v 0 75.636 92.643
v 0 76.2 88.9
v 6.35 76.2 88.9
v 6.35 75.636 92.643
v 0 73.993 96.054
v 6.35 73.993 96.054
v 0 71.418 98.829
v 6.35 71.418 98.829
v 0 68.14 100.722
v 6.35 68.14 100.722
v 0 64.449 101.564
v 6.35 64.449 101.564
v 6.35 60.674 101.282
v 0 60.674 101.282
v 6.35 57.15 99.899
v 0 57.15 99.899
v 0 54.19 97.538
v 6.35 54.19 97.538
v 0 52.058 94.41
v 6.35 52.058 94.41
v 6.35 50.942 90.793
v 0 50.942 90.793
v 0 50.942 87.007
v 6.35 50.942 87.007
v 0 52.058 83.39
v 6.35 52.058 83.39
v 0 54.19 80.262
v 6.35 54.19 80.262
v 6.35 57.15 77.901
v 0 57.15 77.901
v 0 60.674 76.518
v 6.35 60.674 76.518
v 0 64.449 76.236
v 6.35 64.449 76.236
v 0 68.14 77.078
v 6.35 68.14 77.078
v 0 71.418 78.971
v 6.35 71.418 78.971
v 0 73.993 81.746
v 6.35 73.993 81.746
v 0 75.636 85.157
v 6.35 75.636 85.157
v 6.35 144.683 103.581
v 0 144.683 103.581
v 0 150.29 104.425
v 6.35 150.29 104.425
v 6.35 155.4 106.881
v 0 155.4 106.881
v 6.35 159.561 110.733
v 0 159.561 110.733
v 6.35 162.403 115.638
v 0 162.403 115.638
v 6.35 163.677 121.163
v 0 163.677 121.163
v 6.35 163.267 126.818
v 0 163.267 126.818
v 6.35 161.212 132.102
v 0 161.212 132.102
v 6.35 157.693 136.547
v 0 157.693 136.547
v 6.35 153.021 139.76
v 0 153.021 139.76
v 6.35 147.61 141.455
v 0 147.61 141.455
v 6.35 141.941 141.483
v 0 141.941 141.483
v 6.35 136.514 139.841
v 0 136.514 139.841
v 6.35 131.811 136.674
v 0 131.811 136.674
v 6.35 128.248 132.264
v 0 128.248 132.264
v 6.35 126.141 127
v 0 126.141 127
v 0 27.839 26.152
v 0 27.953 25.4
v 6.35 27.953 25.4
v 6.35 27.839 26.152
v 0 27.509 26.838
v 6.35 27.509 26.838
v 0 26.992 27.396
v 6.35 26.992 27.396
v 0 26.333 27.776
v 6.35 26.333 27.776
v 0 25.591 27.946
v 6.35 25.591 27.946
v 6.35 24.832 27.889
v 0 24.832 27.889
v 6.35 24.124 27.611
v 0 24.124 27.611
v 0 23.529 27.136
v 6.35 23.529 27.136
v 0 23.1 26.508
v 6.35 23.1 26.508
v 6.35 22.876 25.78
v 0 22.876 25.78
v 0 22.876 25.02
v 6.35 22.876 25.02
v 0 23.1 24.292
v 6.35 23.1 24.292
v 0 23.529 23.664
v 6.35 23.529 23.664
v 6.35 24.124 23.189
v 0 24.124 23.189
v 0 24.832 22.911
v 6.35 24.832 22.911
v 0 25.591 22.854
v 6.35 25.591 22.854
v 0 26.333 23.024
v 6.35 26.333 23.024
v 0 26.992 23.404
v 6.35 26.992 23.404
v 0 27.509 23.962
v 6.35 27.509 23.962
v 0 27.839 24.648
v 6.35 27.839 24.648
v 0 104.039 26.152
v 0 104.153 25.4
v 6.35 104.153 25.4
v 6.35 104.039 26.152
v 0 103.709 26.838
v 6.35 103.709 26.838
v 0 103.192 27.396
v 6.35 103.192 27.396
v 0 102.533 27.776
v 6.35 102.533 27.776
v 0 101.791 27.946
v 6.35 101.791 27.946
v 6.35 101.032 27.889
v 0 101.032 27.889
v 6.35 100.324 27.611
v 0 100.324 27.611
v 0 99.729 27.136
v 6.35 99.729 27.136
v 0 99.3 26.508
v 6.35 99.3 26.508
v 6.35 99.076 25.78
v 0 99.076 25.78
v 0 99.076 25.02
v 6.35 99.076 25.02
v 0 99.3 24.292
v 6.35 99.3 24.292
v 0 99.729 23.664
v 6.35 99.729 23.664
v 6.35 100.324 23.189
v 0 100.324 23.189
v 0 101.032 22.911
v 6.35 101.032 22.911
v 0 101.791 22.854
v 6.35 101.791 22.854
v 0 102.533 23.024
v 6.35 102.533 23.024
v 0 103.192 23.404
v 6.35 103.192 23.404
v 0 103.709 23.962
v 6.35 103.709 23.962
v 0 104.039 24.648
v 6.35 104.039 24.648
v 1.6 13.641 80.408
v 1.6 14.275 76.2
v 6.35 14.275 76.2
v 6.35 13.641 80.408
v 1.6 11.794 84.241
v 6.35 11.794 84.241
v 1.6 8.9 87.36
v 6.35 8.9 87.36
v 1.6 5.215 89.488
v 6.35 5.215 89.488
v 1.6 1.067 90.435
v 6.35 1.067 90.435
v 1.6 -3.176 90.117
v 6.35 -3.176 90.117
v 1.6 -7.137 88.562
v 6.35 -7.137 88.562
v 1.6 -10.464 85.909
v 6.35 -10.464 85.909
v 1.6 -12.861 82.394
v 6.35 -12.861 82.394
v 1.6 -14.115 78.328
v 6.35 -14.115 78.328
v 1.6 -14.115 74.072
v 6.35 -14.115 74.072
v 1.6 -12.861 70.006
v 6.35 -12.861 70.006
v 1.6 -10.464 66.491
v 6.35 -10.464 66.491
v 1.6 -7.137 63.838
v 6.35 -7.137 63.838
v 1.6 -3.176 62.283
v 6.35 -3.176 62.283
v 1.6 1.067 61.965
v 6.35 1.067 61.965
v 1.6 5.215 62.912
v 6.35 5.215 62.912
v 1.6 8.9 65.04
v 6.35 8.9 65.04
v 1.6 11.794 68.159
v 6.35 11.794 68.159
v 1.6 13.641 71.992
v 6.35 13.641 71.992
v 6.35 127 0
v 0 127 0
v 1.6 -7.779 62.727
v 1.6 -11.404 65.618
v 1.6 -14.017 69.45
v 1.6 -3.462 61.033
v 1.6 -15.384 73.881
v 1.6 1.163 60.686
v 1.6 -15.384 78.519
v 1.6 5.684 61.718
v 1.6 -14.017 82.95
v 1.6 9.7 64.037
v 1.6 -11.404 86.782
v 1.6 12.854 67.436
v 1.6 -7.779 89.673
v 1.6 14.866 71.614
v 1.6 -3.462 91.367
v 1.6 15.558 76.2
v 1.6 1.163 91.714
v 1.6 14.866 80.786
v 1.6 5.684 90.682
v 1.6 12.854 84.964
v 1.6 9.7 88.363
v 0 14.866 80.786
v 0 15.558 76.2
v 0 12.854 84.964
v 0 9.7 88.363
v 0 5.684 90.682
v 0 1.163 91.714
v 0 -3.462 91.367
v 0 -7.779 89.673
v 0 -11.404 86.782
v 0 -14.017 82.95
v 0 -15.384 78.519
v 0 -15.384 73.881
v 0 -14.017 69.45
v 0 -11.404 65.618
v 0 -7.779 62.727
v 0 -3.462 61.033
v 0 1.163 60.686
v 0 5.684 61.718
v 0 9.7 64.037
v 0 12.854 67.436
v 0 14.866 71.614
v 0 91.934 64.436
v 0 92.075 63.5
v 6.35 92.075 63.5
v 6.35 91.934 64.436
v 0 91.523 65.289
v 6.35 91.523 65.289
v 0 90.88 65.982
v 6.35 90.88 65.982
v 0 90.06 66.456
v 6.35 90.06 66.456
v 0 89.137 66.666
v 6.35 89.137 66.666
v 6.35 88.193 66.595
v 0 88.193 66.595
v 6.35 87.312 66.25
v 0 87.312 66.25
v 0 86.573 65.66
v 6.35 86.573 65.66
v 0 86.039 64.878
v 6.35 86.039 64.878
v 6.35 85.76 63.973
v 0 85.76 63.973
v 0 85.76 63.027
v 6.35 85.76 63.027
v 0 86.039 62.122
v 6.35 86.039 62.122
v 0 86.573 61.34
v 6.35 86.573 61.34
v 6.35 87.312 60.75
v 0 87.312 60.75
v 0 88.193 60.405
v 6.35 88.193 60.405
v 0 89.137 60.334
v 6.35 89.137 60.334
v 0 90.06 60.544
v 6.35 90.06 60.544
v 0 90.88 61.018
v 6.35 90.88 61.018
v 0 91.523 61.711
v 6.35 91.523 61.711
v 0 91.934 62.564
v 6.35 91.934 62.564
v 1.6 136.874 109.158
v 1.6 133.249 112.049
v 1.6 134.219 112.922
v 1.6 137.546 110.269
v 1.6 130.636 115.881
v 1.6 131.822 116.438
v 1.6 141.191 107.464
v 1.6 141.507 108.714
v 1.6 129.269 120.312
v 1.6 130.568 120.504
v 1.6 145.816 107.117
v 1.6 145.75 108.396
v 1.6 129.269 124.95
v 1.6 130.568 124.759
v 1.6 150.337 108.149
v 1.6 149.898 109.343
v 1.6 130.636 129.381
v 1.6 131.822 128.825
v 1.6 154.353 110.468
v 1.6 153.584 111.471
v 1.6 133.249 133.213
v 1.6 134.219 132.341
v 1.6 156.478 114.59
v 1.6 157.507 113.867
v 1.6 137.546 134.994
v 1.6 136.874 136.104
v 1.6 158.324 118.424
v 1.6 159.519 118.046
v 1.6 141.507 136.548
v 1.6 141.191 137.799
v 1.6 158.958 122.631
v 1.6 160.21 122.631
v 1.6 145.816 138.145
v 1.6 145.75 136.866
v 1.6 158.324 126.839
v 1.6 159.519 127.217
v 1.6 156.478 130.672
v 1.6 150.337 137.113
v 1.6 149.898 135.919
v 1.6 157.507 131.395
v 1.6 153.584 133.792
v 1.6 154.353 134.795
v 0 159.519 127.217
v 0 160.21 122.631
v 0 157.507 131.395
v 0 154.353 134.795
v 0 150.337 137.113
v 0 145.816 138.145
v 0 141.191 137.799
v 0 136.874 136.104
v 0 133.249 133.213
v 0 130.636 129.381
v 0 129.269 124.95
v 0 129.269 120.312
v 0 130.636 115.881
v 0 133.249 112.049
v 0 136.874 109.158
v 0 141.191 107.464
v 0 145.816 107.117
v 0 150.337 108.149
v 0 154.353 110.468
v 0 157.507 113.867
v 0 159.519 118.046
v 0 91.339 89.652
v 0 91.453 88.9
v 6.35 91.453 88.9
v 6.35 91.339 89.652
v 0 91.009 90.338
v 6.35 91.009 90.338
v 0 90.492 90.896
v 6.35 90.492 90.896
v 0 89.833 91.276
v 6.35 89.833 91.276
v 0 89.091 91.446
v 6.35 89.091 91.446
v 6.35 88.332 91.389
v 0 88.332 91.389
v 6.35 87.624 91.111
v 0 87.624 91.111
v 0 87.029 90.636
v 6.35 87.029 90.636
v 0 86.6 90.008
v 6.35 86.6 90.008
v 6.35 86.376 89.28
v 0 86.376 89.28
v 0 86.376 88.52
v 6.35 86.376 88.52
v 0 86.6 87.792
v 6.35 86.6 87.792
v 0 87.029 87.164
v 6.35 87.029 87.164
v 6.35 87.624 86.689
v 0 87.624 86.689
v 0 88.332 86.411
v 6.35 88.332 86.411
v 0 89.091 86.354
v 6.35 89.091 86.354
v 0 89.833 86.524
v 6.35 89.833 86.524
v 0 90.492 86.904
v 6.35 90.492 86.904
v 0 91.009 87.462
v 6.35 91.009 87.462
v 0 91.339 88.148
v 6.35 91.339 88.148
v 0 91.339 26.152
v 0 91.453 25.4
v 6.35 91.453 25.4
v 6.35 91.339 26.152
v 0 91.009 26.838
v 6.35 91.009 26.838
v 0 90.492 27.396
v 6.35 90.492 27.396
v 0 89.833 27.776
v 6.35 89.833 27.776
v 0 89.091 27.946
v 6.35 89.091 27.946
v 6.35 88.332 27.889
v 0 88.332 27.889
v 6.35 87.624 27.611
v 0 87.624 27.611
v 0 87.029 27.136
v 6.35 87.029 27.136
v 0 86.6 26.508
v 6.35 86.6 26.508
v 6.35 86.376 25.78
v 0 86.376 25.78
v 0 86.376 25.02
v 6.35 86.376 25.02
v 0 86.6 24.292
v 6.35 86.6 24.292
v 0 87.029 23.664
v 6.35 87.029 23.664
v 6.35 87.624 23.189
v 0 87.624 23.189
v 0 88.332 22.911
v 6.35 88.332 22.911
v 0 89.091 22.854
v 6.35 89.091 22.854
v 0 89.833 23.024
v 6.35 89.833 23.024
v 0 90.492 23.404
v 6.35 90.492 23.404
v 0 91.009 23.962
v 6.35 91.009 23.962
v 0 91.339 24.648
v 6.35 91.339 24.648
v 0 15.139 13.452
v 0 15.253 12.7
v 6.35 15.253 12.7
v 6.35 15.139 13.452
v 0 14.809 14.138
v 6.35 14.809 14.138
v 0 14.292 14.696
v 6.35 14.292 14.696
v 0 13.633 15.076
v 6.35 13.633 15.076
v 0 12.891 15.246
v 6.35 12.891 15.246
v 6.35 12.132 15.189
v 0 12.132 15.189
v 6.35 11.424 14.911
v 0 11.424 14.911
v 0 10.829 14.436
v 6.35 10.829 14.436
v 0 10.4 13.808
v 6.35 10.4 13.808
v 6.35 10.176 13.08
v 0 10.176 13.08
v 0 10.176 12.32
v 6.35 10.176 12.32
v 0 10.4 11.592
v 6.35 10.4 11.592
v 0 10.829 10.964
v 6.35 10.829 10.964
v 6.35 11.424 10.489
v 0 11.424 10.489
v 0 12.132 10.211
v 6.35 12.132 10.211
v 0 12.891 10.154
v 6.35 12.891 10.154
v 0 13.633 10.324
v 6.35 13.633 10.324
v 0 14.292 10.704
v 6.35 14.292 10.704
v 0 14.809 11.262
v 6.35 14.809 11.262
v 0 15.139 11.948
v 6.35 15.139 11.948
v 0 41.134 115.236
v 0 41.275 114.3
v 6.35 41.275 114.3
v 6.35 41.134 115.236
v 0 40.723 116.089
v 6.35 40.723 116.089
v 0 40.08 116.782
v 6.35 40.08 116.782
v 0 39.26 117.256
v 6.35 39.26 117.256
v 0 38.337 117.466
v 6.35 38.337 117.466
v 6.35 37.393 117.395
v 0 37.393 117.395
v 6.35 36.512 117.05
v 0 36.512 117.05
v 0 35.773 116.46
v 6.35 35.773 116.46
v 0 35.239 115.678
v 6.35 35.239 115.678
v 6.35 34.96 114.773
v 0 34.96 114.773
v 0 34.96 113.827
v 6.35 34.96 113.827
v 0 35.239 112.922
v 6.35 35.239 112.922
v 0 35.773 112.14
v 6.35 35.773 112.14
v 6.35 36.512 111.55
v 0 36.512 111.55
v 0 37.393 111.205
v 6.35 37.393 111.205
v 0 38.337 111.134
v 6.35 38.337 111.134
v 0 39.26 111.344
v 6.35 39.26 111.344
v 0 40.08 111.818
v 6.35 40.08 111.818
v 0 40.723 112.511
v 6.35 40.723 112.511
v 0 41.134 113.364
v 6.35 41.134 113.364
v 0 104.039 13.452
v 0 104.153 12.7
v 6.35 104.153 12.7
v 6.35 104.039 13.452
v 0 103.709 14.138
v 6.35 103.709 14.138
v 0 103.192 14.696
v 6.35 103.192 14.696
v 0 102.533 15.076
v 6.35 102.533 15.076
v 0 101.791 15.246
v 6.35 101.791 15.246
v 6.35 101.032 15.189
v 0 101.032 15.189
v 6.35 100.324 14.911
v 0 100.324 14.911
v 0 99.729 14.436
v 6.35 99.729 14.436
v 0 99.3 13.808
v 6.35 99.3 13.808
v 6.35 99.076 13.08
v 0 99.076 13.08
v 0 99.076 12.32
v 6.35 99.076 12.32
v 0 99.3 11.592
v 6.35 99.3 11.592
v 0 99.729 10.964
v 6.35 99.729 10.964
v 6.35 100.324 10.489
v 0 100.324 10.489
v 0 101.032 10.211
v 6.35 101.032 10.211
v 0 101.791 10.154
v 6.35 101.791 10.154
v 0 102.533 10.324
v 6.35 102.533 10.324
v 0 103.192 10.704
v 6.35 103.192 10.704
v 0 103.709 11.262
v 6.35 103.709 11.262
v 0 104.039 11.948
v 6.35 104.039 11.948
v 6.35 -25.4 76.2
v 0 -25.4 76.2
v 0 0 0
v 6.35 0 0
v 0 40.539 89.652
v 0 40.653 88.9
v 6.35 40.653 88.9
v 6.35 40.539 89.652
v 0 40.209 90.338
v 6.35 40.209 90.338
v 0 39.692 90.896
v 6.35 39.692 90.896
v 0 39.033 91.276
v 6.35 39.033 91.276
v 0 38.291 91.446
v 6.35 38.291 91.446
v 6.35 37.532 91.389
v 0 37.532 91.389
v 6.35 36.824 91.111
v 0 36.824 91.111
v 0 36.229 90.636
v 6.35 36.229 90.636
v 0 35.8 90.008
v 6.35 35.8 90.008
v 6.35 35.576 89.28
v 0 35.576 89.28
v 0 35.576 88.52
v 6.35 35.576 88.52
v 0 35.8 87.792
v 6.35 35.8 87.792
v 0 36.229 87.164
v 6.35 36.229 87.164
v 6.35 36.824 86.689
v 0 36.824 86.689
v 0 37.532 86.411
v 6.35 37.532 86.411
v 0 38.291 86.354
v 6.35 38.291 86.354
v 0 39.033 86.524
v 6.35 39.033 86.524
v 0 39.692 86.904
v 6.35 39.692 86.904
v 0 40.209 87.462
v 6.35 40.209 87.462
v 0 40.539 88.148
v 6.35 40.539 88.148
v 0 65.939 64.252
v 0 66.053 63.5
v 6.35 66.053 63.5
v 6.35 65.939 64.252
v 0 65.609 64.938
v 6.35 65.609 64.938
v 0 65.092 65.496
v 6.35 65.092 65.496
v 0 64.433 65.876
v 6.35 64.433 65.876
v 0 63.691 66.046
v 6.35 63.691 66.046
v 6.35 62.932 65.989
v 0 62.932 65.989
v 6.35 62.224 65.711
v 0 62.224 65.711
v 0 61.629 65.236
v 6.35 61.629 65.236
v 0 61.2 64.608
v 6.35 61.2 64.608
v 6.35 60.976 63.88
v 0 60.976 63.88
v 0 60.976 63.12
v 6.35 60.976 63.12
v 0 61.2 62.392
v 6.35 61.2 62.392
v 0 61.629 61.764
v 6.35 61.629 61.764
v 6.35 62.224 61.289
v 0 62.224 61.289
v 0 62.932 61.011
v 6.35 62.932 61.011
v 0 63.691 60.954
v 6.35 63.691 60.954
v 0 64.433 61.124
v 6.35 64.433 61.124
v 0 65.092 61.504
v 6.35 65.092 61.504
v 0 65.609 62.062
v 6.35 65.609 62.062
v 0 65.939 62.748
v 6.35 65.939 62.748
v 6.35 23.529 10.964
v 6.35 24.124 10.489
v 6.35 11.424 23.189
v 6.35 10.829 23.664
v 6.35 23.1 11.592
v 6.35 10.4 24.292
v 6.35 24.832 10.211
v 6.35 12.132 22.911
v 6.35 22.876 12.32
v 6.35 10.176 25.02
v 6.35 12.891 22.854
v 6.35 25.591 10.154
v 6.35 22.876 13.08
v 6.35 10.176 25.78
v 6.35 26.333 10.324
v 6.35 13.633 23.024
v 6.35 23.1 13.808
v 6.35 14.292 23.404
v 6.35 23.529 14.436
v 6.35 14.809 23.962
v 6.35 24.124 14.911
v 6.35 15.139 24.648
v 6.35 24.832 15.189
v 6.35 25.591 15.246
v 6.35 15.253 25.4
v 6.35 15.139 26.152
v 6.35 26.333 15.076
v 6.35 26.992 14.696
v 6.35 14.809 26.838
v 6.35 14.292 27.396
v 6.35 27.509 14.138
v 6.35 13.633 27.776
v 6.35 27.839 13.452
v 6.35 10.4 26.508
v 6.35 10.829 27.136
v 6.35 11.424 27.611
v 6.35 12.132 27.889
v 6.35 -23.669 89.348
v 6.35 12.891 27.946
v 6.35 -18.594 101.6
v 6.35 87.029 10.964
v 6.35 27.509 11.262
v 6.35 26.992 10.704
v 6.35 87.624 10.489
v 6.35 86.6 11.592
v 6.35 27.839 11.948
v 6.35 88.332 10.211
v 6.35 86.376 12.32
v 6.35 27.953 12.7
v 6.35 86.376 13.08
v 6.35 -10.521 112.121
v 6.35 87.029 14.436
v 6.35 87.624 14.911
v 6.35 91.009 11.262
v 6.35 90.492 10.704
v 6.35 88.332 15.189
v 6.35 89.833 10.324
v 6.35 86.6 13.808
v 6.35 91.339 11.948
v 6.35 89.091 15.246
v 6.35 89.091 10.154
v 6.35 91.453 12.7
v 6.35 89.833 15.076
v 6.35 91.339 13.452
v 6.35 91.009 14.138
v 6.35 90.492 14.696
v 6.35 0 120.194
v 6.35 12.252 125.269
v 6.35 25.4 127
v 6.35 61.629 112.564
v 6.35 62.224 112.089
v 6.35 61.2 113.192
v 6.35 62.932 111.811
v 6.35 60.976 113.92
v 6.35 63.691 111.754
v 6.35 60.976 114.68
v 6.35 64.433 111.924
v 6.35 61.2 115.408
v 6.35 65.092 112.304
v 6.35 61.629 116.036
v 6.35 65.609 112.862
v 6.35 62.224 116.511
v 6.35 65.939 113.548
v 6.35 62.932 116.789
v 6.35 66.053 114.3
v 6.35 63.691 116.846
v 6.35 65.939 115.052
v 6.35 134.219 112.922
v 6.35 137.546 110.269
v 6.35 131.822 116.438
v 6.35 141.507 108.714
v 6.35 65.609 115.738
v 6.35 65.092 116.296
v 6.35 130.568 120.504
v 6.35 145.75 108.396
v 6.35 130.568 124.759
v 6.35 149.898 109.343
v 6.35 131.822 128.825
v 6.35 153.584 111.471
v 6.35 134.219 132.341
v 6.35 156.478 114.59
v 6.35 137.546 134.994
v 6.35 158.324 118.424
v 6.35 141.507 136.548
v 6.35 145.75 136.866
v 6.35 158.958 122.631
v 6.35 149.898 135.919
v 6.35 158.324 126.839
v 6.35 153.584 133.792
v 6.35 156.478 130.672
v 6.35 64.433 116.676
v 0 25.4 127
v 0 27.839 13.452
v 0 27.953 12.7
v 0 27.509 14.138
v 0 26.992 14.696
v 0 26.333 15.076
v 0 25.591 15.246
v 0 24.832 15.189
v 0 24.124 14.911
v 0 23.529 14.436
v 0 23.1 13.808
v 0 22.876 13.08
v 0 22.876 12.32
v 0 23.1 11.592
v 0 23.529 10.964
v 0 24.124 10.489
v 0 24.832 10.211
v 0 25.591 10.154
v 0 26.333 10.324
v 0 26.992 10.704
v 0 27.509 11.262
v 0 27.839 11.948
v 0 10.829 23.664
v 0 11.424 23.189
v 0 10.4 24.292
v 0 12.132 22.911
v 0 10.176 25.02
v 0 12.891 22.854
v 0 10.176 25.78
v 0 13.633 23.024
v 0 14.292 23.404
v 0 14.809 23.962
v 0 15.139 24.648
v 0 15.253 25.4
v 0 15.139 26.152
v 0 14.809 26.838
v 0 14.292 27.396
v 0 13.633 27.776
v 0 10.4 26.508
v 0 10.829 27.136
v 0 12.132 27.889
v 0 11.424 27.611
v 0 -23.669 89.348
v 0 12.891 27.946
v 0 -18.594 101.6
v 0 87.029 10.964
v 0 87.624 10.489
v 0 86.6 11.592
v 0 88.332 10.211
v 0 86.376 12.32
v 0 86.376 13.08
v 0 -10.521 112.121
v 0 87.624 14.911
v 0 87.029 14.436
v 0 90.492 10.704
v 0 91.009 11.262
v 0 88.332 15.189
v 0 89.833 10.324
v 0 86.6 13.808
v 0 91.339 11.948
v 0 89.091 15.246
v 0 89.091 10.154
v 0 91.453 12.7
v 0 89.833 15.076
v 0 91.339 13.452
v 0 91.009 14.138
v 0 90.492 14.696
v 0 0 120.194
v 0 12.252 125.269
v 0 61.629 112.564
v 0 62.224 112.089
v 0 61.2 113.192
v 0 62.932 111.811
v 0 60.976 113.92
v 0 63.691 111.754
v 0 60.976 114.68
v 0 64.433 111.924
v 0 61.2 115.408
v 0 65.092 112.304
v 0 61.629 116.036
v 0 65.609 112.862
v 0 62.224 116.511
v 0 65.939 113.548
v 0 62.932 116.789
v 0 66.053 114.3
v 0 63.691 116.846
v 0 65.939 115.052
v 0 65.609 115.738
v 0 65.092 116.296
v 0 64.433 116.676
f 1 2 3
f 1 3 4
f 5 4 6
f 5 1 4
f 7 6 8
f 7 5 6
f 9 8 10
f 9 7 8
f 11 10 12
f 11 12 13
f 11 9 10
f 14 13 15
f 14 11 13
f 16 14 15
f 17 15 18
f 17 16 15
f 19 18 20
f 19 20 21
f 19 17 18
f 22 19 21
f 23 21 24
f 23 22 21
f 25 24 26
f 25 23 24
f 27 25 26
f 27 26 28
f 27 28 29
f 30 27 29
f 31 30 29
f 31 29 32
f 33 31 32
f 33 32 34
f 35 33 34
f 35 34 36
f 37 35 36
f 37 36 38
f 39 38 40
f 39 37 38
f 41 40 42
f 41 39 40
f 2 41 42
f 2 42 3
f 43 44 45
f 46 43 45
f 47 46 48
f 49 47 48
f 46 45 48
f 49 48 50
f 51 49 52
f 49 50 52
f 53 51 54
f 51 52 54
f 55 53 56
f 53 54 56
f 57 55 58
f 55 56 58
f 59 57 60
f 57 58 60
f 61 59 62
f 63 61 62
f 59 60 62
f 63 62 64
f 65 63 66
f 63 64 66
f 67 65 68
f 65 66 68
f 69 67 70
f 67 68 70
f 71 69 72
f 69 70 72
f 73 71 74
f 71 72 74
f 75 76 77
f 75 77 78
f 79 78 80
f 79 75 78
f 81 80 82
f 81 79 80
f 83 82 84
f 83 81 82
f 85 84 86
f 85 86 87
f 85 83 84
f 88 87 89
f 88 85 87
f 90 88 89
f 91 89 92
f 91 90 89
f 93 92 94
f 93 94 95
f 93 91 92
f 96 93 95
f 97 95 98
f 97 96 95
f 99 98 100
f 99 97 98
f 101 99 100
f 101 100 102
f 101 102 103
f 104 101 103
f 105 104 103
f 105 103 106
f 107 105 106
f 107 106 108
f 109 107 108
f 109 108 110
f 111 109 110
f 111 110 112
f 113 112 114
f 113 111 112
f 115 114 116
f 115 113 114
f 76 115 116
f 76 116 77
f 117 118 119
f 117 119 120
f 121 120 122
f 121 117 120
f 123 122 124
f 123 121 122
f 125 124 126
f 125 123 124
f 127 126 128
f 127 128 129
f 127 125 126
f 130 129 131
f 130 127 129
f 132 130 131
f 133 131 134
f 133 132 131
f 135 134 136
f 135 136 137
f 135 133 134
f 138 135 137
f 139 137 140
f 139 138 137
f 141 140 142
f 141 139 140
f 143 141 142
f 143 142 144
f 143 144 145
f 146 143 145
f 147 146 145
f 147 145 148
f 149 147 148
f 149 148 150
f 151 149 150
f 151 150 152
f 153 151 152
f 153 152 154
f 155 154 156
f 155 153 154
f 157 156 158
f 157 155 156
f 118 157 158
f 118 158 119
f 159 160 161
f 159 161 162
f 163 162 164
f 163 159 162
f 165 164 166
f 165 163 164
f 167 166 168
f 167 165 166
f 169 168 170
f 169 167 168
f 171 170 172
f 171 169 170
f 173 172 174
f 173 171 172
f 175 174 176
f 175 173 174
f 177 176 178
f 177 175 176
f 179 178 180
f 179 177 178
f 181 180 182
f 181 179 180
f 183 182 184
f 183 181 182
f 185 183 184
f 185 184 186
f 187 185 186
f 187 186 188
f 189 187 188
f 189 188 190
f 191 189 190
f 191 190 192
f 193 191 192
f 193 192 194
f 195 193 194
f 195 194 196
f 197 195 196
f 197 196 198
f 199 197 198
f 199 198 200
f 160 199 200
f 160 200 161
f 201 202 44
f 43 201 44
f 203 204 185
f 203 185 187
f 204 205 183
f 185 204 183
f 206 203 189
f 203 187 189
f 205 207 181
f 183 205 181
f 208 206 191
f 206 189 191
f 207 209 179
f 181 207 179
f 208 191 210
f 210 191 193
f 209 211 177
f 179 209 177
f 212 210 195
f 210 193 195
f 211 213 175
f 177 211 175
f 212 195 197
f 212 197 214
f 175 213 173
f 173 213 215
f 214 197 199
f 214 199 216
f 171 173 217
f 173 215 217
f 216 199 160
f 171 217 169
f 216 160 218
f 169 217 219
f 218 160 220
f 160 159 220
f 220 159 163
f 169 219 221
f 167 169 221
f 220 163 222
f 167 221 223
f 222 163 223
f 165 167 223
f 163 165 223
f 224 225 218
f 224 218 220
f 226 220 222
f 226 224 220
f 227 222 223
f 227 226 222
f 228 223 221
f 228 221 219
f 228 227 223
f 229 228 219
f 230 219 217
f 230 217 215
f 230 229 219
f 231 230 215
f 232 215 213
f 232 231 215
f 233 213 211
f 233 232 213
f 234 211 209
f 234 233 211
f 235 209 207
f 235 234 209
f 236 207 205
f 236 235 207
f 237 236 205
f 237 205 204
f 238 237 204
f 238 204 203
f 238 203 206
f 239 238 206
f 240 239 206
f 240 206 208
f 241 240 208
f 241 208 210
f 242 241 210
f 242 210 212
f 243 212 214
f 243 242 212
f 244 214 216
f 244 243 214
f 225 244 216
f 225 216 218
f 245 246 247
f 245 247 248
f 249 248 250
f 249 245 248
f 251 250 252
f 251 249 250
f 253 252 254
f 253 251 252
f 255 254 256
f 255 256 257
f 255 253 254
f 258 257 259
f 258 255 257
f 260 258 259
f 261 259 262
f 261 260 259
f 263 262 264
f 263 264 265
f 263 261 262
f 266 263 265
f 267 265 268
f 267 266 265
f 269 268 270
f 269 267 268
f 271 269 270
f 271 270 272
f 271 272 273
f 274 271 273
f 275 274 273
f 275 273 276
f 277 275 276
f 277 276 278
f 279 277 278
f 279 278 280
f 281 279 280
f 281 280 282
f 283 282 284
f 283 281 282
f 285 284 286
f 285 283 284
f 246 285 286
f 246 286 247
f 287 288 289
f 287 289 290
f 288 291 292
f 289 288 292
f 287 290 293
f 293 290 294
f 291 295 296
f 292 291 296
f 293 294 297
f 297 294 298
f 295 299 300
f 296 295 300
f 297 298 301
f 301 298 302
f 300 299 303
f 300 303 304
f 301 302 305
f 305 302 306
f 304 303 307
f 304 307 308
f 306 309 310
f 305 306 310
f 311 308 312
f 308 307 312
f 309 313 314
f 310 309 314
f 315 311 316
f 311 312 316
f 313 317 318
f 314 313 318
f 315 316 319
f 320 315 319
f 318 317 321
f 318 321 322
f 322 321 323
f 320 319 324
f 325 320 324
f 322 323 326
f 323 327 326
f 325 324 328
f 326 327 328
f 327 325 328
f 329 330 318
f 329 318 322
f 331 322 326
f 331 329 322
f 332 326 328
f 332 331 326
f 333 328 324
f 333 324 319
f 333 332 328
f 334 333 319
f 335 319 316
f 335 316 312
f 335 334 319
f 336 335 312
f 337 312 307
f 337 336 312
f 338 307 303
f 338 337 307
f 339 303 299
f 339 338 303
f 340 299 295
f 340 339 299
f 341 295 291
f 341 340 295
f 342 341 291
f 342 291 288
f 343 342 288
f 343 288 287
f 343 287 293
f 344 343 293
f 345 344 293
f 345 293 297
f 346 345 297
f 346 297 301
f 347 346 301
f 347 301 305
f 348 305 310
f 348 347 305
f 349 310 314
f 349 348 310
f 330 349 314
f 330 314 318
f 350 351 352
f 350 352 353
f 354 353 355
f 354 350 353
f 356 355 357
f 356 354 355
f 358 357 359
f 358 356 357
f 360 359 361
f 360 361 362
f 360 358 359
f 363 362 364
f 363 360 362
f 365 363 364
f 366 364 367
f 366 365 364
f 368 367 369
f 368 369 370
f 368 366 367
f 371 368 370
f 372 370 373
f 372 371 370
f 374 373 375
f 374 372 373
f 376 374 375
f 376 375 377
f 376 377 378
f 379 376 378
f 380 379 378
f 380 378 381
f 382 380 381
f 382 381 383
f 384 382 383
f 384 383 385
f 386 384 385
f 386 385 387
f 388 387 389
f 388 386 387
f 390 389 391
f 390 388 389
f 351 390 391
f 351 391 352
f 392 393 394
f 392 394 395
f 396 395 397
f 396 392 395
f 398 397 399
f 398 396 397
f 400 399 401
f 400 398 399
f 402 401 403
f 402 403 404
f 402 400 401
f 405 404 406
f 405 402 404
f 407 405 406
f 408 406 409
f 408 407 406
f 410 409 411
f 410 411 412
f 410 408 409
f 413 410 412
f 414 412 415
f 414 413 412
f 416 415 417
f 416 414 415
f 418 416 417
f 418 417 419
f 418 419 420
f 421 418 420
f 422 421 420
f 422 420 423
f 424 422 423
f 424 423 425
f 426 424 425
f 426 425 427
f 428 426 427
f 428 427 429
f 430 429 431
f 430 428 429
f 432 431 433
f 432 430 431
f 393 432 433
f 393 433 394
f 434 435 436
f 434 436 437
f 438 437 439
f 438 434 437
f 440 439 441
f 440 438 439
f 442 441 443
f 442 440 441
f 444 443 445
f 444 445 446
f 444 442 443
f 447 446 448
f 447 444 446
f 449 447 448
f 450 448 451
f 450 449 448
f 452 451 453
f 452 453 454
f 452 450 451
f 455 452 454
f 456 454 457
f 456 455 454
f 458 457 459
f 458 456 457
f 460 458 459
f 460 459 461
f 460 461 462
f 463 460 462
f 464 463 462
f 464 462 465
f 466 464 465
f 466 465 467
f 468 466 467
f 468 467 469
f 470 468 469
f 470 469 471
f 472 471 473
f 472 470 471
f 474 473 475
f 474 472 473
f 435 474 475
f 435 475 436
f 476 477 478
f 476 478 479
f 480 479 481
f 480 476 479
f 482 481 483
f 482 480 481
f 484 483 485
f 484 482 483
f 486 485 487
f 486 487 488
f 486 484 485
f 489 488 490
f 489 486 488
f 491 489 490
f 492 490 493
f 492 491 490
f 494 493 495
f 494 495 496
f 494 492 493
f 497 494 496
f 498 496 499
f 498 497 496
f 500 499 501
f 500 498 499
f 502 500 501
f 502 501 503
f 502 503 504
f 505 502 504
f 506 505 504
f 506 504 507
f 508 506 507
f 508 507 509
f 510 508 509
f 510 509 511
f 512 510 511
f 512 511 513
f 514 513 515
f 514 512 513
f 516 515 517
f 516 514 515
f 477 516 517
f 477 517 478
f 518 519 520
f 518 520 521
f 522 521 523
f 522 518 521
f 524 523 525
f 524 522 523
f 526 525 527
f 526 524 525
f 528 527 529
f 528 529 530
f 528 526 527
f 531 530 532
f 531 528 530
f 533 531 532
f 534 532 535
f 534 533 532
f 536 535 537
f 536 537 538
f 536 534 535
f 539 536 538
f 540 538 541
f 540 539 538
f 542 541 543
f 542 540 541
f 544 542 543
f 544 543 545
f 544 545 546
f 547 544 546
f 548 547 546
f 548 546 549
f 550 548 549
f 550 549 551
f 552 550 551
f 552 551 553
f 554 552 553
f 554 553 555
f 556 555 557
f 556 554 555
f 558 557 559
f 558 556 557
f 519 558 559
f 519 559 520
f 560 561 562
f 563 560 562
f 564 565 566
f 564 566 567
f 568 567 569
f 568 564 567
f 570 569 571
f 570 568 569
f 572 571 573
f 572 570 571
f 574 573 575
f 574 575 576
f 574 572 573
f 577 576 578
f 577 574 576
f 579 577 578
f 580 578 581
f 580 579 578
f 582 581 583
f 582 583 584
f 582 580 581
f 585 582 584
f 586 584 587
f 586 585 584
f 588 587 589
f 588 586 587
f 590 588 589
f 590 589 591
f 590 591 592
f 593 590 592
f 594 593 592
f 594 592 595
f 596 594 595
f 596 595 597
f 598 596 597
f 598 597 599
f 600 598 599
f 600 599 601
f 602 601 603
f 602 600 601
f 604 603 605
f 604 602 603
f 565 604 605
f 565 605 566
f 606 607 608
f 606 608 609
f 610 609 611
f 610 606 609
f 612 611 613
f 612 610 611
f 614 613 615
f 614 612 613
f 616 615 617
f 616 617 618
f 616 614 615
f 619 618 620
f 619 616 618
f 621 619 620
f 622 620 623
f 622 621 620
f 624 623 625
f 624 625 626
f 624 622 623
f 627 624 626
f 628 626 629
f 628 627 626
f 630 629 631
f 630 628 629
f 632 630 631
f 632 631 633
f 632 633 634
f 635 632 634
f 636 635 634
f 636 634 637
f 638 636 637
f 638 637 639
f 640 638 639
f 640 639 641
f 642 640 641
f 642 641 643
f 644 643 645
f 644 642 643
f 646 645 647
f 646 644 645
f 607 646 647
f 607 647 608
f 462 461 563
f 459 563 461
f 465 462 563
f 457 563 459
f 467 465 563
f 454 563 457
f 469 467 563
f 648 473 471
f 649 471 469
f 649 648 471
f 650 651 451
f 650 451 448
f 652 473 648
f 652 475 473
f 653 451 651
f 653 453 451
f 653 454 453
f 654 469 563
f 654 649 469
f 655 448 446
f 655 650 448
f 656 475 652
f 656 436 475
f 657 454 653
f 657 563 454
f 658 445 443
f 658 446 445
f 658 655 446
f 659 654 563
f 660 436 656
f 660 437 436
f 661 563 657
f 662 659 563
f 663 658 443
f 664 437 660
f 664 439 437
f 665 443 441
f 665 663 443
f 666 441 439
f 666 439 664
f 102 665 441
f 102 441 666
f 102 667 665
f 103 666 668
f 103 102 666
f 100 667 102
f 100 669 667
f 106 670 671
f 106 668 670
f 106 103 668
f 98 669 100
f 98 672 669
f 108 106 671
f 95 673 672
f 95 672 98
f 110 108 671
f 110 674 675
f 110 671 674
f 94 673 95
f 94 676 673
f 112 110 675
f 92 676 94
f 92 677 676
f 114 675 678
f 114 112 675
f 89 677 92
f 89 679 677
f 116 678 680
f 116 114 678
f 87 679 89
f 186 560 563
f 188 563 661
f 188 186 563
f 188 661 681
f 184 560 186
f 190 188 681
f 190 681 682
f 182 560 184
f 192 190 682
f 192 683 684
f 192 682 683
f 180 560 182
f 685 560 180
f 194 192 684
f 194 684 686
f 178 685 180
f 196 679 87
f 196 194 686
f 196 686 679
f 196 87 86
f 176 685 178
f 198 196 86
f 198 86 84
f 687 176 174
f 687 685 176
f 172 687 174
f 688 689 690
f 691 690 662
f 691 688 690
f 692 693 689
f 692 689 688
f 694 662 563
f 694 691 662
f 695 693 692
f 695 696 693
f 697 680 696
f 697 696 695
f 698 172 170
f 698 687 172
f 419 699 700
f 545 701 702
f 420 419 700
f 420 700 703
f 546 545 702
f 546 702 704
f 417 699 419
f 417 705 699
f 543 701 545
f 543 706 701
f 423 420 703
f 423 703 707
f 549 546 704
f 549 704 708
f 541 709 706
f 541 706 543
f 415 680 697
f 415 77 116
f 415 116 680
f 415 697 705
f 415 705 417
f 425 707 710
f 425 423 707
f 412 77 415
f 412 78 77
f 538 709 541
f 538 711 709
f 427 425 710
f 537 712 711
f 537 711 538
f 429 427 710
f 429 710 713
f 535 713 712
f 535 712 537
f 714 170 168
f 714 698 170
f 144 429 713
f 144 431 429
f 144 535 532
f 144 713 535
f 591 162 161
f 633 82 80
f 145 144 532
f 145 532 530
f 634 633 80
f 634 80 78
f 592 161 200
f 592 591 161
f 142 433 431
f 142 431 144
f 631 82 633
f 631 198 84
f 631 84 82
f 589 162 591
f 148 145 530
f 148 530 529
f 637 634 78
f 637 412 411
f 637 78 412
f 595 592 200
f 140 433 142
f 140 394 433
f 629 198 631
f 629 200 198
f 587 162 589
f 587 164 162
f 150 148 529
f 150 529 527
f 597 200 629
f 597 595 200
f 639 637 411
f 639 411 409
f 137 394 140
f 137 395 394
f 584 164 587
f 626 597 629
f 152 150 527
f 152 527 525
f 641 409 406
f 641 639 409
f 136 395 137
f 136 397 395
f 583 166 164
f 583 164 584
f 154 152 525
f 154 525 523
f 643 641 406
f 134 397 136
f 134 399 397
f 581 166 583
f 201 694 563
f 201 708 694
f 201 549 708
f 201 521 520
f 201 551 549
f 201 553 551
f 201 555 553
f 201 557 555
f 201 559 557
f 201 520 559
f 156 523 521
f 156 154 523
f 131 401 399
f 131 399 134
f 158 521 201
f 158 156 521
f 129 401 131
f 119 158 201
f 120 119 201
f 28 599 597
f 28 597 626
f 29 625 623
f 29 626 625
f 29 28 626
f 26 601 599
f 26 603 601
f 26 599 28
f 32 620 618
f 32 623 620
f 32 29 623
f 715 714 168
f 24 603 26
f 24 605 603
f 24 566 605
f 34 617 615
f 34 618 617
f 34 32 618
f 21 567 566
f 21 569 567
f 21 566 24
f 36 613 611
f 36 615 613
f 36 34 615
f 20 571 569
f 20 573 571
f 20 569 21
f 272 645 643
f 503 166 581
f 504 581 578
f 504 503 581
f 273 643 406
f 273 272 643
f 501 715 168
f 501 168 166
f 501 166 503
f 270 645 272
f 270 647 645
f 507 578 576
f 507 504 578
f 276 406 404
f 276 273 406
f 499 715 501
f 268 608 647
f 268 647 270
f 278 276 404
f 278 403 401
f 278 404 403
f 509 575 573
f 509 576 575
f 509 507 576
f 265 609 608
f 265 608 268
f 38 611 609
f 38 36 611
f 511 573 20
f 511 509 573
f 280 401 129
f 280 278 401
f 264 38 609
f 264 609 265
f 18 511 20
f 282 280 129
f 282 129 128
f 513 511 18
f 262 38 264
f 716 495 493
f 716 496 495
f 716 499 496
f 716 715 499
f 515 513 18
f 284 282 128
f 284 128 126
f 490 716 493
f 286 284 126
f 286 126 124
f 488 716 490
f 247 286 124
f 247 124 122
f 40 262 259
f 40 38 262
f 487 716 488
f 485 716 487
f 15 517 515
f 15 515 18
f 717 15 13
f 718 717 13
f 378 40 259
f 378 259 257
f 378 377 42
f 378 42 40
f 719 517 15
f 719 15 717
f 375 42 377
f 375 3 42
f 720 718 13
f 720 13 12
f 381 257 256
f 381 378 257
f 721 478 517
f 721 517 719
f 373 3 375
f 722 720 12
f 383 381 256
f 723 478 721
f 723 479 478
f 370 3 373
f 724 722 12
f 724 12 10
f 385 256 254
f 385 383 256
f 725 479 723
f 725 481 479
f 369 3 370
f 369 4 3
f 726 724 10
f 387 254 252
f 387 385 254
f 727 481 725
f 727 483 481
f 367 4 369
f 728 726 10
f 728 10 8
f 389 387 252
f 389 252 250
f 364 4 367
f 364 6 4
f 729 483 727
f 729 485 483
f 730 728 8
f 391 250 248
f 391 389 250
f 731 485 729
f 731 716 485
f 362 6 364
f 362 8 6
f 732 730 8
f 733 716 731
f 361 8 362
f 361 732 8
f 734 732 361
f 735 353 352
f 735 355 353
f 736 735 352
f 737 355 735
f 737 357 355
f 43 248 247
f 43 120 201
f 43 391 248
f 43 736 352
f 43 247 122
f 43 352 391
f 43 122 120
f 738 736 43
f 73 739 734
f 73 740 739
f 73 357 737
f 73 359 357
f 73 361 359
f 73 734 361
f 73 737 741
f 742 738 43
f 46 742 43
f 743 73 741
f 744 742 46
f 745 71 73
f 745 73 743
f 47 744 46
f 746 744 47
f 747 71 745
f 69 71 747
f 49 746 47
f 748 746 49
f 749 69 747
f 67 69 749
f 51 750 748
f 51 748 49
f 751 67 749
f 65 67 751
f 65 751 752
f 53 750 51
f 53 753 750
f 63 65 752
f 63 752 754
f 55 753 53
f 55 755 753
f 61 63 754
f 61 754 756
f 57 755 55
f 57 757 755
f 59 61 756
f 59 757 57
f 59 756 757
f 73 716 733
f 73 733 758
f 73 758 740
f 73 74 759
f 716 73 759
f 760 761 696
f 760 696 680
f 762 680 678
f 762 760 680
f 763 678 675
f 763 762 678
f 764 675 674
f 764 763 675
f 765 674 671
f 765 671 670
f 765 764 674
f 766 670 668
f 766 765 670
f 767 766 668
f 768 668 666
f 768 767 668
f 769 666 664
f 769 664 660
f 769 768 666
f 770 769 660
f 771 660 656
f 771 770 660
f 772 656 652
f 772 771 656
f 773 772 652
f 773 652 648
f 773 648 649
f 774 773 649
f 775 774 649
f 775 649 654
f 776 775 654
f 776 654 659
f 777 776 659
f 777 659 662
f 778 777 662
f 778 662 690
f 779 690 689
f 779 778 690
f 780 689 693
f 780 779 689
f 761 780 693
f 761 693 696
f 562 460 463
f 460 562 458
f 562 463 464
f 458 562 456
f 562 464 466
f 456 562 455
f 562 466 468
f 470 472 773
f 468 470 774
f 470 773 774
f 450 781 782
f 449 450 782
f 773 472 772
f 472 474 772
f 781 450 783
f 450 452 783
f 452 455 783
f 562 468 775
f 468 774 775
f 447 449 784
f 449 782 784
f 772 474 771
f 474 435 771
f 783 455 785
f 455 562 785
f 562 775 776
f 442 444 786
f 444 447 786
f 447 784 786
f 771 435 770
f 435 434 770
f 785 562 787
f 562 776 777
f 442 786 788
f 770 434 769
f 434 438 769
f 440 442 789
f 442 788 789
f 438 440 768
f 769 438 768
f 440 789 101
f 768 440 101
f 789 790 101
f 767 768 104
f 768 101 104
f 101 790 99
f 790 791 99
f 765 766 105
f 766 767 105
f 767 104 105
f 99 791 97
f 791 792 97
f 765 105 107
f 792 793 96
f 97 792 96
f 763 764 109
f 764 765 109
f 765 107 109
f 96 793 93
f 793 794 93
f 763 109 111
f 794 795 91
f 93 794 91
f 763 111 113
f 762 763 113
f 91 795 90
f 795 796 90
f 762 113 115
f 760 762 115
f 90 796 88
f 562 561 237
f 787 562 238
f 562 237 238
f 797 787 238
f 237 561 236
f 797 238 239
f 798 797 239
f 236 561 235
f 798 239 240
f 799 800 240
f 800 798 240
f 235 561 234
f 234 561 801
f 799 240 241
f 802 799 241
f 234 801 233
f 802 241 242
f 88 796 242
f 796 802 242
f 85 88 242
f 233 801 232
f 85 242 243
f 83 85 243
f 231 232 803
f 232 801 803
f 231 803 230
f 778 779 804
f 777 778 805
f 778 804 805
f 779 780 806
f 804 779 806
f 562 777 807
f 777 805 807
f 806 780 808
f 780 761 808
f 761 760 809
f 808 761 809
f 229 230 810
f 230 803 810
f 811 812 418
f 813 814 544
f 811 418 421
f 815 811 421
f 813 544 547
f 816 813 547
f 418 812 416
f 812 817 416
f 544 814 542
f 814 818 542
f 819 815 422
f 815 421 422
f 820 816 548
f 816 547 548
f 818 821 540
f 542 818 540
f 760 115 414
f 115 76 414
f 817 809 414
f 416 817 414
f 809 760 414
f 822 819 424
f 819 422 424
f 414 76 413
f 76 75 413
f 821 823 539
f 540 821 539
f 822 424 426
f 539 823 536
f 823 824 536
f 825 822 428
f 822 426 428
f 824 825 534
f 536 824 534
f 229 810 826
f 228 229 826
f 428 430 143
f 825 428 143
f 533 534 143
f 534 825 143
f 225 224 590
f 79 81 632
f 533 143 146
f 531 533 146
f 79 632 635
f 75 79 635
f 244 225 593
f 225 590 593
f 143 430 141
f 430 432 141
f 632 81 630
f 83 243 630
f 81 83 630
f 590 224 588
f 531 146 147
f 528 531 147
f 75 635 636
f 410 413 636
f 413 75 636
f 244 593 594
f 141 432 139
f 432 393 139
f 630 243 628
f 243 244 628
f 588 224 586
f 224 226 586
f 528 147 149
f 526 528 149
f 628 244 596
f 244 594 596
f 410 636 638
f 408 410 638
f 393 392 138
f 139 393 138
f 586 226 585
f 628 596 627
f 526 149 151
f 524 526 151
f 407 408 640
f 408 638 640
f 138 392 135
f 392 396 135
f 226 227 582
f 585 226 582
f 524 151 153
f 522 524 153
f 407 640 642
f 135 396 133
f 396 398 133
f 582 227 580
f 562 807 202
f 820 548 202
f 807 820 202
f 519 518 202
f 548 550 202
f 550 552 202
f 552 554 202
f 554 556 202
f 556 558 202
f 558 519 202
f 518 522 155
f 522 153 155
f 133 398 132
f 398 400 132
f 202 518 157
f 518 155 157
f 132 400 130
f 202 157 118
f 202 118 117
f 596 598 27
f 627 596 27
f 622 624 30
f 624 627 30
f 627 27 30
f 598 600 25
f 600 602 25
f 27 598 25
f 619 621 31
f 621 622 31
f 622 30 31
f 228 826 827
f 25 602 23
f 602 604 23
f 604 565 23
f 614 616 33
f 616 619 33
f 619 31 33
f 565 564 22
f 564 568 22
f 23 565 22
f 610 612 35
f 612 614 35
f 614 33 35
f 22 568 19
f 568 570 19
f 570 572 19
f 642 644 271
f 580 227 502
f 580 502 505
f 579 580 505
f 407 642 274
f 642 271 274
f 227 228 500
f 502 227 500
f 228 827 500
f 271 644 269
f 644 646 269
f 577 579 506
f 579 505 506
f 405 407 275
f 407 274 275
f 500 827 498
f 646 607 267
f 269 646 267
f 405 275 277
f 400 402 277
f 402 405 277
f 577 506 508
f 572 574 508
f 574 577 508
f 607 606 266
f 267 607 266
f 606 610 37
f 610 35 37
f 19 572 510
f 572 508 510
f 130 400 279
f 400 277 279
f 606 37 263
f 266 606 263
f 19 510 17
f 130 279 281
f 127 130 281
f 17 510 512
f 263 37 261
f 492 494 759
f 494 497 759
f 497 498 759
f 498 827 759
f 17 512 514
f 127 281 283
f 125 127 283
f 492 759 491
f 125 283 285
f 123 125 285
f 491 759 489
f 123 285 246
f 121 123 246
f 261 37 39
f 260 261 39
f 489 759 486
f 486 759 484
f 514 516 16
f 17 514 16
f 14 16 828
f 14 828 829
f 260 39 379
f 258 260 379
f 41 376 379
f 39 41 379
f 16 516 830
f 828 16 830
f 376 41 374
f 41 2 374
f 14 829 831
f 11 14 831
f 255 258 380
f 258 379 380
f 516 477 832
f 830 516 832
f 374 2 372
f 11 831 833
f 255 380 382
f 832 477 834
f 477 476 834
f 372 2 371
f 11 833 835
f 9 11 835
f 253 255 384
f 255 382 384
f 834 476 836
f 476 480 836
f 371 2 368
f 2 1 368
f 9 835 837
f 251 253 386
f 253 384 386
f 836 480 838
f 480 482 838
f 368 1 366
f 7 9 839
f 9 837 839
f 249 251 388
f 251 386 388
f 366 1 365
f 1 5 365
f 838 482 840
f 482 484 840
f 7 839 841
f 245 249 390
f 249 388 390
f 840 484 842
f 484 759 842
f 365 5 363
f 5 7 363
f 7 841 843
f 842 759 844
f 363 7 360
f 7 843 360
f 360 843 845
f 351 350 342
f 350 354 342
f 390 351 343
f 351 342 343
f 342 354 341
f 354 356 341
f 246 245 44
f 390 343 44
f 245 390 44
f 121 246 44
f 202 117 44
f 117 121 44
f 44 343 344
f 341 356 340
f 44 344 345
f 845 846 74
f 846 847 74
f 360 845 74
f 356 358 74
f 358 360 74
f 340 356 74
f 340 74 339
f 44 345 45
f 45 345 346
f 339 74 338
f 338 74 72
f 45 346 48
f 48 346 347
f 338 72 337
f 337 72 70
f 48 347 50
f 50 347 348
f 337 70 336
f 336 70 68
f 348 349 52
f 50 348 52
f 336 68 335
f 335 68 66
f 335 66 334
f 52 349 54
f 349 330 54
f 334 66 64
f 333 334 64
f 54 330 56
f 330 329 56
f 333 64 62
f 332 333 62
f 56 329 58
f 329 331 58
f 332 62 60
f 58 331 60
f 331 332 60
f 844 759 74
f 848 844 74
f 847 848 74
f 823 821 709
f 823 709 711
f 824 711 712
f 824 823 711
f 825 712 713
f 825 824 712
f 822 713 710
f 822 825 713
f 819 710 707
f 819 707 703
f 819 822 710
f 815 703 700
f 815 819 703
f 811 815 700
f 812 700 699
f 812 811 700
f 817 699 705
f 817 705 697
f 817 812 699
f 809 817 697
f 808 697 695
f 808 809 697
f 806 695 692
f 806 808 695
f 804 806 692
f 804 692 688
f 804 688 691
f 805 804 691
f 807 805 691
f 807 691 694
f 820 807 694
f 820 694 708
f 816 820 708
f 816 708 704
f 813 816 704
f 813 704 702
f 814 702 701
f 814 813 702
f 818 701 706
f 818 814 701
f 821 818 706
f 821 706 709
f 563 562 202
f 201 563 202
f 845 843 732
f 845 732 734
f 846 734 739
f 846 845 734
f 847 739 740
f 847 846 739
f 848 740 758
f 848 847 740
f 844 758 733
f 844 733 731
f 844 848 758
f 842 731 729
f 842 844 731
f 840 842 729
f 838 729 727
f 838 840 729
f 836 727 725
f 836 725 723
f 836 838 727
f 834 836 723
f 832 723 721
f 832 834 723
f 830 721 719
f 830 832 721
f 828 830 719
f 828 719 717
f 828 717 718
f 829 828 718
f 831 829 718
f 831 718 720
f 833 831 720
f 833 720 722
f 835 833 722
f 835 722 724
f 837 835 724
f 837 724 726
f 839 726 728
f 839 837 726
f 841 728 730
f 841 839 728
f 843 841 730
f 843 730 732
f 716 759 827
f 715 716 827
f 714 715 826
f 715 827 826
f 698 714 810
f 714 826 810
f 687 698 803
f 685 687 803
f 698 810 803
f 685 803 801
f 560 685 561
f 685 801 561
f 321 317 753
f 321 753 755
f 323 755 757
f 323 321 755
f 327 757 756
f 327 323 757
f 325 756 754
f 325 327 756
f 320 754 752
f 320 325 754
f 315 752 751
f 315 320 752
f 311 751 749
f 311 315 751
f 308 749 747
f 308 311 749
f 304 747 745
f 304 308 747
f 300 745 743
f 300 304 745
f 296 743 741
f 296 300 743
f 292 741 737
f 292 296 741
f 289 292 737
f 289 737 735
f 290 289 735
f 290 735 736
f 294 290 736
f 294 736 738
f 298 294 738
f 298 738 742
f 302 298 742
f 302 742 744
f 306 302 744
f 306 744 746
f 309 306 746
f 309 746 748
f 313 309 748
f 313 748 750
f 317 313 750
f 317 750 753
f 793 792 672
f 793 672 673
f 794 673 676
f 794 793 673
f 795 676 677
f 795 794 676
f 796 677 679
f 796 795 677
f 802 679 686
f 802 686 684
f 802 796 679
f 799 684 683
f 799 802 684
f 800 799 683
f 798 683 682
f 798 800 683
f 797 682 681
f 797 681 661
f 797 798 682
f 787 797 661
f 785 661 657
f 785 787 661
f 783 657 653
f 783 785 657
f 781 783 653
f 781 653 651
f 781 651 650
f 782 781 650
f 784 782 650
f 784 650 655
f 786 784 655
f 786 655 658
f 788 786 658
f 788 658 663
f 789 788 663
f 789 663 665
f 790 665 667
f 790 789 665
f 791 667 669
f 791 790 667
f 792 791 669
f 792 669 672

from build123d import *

# Parameters (mm, degrees)
F0_R     = 2.5527
F0_R_2   = 3.175
F0_R_3   = 14.2748
F0_R_4   = 12.7
F1_DEPTH = 6.35
F2_R     = 15.5575
F3_DEPTH = 1.6002


with BuildPart() as f1:
    # F0 (on Right) → F1 (new body)
    with BuildSketch(Plane.YZ):
        with BuildLine():
            Line((126.1410294417, 127), (25.4, 127))
            ThreePointArc((25.4, 127), (-10.5210244843, 112.1210244843), (-25.4, 76.2))
            Line((-25.4, 76.2), (0, 0))
            Line((0, 0), (12.7, 0))
            Line((12.7, 0), (25.4, 0))
            Line((25.4, 0), (101.6, 0))
            Line((101.6, 0), (127, 0))
            Line((127, 0), (144.6833077958, 103.5812))
            ThreePointArc((144.6833077958, 103.5812), (159.618637387, 134.4565300165), (126.1410294417, 127))
        make_face()
        with Locations((12.7, 12.7)):
            Circle(F0_R, mode=Mode.SUBTRACT)
        with Locations((12.7, 25.4)):
            Circle(F0_R, mode=Mode.SUBTRACT)
        with Locations((25.4, 12.7)):
            Circle(F0_R, mode=Mode.SUBTRACT)
        with Locations((25.4, 25.4)):
            Circle(F0_R, mode=Mode.SUBTRACT)
        with Locations((63.5, 63.5)):
            Circle(F0_R, mode=Mode.SUBTRACT)
        with Locations((88.9, 12.7)):
            Circle(F0_R, mode=Mode.SUBTRACT)
        with Locations((101.6, 12.7)):
            Circle(F0_R, mode=Mode.SUBTRACT)
        with Locations((88.9, 25.4)):
            Circle(F0_R, mode=Mode.SUBTRACT)
        with Locations((101.6, 25.4)):
            Circle(F0_R, mode=Mode.SUBTRACT)
        with Locations((88.9, 63.5)):
            Circle(F0_R_2, mode=Mode.SUBTRACT)
        with Locations((0, 76.2)):
            Circle(F0_R_3, mode=Mode.SUBTRACT)
        with Locations((38.1, 88.9)):
            Circle(F0_R, mode=Mode.SUBTRACT)
        with Locations((63.5, 88.9)):
            Circle(F0_R_4, mode=Mode.SUBTRACT)
        with Locations((38.1, 114.3)):
            Circle(F0_R_2, mode=Mode.SUBTRACT)
        with Locations((63.5, 114.3)):
            Circle(F0_R, mode=Mode.SUBTRACT)
        with Locations((88.9, 88.9)):
            Circle(F0_R, mode=Mode.SUBTRACT)
        with Locations((144.6833077958, 122.6312)):
            Circle(F0_R_3, mode=Mode.SUBTRACT)
    extrude(amount=F1_DEPTH)

    # F2 (on Right) → F3 (cut)
    with BuildSketch(Plane.YZ):
        with Locations((0, 76.2)):
            Circle(F2_R)
        with Locations((144.653, 122.6312)):
            Circle(F2_R)
    extrude(amount=F3_DEPTH, mode=Mode.SUBTRACT)


solid = f1.part
